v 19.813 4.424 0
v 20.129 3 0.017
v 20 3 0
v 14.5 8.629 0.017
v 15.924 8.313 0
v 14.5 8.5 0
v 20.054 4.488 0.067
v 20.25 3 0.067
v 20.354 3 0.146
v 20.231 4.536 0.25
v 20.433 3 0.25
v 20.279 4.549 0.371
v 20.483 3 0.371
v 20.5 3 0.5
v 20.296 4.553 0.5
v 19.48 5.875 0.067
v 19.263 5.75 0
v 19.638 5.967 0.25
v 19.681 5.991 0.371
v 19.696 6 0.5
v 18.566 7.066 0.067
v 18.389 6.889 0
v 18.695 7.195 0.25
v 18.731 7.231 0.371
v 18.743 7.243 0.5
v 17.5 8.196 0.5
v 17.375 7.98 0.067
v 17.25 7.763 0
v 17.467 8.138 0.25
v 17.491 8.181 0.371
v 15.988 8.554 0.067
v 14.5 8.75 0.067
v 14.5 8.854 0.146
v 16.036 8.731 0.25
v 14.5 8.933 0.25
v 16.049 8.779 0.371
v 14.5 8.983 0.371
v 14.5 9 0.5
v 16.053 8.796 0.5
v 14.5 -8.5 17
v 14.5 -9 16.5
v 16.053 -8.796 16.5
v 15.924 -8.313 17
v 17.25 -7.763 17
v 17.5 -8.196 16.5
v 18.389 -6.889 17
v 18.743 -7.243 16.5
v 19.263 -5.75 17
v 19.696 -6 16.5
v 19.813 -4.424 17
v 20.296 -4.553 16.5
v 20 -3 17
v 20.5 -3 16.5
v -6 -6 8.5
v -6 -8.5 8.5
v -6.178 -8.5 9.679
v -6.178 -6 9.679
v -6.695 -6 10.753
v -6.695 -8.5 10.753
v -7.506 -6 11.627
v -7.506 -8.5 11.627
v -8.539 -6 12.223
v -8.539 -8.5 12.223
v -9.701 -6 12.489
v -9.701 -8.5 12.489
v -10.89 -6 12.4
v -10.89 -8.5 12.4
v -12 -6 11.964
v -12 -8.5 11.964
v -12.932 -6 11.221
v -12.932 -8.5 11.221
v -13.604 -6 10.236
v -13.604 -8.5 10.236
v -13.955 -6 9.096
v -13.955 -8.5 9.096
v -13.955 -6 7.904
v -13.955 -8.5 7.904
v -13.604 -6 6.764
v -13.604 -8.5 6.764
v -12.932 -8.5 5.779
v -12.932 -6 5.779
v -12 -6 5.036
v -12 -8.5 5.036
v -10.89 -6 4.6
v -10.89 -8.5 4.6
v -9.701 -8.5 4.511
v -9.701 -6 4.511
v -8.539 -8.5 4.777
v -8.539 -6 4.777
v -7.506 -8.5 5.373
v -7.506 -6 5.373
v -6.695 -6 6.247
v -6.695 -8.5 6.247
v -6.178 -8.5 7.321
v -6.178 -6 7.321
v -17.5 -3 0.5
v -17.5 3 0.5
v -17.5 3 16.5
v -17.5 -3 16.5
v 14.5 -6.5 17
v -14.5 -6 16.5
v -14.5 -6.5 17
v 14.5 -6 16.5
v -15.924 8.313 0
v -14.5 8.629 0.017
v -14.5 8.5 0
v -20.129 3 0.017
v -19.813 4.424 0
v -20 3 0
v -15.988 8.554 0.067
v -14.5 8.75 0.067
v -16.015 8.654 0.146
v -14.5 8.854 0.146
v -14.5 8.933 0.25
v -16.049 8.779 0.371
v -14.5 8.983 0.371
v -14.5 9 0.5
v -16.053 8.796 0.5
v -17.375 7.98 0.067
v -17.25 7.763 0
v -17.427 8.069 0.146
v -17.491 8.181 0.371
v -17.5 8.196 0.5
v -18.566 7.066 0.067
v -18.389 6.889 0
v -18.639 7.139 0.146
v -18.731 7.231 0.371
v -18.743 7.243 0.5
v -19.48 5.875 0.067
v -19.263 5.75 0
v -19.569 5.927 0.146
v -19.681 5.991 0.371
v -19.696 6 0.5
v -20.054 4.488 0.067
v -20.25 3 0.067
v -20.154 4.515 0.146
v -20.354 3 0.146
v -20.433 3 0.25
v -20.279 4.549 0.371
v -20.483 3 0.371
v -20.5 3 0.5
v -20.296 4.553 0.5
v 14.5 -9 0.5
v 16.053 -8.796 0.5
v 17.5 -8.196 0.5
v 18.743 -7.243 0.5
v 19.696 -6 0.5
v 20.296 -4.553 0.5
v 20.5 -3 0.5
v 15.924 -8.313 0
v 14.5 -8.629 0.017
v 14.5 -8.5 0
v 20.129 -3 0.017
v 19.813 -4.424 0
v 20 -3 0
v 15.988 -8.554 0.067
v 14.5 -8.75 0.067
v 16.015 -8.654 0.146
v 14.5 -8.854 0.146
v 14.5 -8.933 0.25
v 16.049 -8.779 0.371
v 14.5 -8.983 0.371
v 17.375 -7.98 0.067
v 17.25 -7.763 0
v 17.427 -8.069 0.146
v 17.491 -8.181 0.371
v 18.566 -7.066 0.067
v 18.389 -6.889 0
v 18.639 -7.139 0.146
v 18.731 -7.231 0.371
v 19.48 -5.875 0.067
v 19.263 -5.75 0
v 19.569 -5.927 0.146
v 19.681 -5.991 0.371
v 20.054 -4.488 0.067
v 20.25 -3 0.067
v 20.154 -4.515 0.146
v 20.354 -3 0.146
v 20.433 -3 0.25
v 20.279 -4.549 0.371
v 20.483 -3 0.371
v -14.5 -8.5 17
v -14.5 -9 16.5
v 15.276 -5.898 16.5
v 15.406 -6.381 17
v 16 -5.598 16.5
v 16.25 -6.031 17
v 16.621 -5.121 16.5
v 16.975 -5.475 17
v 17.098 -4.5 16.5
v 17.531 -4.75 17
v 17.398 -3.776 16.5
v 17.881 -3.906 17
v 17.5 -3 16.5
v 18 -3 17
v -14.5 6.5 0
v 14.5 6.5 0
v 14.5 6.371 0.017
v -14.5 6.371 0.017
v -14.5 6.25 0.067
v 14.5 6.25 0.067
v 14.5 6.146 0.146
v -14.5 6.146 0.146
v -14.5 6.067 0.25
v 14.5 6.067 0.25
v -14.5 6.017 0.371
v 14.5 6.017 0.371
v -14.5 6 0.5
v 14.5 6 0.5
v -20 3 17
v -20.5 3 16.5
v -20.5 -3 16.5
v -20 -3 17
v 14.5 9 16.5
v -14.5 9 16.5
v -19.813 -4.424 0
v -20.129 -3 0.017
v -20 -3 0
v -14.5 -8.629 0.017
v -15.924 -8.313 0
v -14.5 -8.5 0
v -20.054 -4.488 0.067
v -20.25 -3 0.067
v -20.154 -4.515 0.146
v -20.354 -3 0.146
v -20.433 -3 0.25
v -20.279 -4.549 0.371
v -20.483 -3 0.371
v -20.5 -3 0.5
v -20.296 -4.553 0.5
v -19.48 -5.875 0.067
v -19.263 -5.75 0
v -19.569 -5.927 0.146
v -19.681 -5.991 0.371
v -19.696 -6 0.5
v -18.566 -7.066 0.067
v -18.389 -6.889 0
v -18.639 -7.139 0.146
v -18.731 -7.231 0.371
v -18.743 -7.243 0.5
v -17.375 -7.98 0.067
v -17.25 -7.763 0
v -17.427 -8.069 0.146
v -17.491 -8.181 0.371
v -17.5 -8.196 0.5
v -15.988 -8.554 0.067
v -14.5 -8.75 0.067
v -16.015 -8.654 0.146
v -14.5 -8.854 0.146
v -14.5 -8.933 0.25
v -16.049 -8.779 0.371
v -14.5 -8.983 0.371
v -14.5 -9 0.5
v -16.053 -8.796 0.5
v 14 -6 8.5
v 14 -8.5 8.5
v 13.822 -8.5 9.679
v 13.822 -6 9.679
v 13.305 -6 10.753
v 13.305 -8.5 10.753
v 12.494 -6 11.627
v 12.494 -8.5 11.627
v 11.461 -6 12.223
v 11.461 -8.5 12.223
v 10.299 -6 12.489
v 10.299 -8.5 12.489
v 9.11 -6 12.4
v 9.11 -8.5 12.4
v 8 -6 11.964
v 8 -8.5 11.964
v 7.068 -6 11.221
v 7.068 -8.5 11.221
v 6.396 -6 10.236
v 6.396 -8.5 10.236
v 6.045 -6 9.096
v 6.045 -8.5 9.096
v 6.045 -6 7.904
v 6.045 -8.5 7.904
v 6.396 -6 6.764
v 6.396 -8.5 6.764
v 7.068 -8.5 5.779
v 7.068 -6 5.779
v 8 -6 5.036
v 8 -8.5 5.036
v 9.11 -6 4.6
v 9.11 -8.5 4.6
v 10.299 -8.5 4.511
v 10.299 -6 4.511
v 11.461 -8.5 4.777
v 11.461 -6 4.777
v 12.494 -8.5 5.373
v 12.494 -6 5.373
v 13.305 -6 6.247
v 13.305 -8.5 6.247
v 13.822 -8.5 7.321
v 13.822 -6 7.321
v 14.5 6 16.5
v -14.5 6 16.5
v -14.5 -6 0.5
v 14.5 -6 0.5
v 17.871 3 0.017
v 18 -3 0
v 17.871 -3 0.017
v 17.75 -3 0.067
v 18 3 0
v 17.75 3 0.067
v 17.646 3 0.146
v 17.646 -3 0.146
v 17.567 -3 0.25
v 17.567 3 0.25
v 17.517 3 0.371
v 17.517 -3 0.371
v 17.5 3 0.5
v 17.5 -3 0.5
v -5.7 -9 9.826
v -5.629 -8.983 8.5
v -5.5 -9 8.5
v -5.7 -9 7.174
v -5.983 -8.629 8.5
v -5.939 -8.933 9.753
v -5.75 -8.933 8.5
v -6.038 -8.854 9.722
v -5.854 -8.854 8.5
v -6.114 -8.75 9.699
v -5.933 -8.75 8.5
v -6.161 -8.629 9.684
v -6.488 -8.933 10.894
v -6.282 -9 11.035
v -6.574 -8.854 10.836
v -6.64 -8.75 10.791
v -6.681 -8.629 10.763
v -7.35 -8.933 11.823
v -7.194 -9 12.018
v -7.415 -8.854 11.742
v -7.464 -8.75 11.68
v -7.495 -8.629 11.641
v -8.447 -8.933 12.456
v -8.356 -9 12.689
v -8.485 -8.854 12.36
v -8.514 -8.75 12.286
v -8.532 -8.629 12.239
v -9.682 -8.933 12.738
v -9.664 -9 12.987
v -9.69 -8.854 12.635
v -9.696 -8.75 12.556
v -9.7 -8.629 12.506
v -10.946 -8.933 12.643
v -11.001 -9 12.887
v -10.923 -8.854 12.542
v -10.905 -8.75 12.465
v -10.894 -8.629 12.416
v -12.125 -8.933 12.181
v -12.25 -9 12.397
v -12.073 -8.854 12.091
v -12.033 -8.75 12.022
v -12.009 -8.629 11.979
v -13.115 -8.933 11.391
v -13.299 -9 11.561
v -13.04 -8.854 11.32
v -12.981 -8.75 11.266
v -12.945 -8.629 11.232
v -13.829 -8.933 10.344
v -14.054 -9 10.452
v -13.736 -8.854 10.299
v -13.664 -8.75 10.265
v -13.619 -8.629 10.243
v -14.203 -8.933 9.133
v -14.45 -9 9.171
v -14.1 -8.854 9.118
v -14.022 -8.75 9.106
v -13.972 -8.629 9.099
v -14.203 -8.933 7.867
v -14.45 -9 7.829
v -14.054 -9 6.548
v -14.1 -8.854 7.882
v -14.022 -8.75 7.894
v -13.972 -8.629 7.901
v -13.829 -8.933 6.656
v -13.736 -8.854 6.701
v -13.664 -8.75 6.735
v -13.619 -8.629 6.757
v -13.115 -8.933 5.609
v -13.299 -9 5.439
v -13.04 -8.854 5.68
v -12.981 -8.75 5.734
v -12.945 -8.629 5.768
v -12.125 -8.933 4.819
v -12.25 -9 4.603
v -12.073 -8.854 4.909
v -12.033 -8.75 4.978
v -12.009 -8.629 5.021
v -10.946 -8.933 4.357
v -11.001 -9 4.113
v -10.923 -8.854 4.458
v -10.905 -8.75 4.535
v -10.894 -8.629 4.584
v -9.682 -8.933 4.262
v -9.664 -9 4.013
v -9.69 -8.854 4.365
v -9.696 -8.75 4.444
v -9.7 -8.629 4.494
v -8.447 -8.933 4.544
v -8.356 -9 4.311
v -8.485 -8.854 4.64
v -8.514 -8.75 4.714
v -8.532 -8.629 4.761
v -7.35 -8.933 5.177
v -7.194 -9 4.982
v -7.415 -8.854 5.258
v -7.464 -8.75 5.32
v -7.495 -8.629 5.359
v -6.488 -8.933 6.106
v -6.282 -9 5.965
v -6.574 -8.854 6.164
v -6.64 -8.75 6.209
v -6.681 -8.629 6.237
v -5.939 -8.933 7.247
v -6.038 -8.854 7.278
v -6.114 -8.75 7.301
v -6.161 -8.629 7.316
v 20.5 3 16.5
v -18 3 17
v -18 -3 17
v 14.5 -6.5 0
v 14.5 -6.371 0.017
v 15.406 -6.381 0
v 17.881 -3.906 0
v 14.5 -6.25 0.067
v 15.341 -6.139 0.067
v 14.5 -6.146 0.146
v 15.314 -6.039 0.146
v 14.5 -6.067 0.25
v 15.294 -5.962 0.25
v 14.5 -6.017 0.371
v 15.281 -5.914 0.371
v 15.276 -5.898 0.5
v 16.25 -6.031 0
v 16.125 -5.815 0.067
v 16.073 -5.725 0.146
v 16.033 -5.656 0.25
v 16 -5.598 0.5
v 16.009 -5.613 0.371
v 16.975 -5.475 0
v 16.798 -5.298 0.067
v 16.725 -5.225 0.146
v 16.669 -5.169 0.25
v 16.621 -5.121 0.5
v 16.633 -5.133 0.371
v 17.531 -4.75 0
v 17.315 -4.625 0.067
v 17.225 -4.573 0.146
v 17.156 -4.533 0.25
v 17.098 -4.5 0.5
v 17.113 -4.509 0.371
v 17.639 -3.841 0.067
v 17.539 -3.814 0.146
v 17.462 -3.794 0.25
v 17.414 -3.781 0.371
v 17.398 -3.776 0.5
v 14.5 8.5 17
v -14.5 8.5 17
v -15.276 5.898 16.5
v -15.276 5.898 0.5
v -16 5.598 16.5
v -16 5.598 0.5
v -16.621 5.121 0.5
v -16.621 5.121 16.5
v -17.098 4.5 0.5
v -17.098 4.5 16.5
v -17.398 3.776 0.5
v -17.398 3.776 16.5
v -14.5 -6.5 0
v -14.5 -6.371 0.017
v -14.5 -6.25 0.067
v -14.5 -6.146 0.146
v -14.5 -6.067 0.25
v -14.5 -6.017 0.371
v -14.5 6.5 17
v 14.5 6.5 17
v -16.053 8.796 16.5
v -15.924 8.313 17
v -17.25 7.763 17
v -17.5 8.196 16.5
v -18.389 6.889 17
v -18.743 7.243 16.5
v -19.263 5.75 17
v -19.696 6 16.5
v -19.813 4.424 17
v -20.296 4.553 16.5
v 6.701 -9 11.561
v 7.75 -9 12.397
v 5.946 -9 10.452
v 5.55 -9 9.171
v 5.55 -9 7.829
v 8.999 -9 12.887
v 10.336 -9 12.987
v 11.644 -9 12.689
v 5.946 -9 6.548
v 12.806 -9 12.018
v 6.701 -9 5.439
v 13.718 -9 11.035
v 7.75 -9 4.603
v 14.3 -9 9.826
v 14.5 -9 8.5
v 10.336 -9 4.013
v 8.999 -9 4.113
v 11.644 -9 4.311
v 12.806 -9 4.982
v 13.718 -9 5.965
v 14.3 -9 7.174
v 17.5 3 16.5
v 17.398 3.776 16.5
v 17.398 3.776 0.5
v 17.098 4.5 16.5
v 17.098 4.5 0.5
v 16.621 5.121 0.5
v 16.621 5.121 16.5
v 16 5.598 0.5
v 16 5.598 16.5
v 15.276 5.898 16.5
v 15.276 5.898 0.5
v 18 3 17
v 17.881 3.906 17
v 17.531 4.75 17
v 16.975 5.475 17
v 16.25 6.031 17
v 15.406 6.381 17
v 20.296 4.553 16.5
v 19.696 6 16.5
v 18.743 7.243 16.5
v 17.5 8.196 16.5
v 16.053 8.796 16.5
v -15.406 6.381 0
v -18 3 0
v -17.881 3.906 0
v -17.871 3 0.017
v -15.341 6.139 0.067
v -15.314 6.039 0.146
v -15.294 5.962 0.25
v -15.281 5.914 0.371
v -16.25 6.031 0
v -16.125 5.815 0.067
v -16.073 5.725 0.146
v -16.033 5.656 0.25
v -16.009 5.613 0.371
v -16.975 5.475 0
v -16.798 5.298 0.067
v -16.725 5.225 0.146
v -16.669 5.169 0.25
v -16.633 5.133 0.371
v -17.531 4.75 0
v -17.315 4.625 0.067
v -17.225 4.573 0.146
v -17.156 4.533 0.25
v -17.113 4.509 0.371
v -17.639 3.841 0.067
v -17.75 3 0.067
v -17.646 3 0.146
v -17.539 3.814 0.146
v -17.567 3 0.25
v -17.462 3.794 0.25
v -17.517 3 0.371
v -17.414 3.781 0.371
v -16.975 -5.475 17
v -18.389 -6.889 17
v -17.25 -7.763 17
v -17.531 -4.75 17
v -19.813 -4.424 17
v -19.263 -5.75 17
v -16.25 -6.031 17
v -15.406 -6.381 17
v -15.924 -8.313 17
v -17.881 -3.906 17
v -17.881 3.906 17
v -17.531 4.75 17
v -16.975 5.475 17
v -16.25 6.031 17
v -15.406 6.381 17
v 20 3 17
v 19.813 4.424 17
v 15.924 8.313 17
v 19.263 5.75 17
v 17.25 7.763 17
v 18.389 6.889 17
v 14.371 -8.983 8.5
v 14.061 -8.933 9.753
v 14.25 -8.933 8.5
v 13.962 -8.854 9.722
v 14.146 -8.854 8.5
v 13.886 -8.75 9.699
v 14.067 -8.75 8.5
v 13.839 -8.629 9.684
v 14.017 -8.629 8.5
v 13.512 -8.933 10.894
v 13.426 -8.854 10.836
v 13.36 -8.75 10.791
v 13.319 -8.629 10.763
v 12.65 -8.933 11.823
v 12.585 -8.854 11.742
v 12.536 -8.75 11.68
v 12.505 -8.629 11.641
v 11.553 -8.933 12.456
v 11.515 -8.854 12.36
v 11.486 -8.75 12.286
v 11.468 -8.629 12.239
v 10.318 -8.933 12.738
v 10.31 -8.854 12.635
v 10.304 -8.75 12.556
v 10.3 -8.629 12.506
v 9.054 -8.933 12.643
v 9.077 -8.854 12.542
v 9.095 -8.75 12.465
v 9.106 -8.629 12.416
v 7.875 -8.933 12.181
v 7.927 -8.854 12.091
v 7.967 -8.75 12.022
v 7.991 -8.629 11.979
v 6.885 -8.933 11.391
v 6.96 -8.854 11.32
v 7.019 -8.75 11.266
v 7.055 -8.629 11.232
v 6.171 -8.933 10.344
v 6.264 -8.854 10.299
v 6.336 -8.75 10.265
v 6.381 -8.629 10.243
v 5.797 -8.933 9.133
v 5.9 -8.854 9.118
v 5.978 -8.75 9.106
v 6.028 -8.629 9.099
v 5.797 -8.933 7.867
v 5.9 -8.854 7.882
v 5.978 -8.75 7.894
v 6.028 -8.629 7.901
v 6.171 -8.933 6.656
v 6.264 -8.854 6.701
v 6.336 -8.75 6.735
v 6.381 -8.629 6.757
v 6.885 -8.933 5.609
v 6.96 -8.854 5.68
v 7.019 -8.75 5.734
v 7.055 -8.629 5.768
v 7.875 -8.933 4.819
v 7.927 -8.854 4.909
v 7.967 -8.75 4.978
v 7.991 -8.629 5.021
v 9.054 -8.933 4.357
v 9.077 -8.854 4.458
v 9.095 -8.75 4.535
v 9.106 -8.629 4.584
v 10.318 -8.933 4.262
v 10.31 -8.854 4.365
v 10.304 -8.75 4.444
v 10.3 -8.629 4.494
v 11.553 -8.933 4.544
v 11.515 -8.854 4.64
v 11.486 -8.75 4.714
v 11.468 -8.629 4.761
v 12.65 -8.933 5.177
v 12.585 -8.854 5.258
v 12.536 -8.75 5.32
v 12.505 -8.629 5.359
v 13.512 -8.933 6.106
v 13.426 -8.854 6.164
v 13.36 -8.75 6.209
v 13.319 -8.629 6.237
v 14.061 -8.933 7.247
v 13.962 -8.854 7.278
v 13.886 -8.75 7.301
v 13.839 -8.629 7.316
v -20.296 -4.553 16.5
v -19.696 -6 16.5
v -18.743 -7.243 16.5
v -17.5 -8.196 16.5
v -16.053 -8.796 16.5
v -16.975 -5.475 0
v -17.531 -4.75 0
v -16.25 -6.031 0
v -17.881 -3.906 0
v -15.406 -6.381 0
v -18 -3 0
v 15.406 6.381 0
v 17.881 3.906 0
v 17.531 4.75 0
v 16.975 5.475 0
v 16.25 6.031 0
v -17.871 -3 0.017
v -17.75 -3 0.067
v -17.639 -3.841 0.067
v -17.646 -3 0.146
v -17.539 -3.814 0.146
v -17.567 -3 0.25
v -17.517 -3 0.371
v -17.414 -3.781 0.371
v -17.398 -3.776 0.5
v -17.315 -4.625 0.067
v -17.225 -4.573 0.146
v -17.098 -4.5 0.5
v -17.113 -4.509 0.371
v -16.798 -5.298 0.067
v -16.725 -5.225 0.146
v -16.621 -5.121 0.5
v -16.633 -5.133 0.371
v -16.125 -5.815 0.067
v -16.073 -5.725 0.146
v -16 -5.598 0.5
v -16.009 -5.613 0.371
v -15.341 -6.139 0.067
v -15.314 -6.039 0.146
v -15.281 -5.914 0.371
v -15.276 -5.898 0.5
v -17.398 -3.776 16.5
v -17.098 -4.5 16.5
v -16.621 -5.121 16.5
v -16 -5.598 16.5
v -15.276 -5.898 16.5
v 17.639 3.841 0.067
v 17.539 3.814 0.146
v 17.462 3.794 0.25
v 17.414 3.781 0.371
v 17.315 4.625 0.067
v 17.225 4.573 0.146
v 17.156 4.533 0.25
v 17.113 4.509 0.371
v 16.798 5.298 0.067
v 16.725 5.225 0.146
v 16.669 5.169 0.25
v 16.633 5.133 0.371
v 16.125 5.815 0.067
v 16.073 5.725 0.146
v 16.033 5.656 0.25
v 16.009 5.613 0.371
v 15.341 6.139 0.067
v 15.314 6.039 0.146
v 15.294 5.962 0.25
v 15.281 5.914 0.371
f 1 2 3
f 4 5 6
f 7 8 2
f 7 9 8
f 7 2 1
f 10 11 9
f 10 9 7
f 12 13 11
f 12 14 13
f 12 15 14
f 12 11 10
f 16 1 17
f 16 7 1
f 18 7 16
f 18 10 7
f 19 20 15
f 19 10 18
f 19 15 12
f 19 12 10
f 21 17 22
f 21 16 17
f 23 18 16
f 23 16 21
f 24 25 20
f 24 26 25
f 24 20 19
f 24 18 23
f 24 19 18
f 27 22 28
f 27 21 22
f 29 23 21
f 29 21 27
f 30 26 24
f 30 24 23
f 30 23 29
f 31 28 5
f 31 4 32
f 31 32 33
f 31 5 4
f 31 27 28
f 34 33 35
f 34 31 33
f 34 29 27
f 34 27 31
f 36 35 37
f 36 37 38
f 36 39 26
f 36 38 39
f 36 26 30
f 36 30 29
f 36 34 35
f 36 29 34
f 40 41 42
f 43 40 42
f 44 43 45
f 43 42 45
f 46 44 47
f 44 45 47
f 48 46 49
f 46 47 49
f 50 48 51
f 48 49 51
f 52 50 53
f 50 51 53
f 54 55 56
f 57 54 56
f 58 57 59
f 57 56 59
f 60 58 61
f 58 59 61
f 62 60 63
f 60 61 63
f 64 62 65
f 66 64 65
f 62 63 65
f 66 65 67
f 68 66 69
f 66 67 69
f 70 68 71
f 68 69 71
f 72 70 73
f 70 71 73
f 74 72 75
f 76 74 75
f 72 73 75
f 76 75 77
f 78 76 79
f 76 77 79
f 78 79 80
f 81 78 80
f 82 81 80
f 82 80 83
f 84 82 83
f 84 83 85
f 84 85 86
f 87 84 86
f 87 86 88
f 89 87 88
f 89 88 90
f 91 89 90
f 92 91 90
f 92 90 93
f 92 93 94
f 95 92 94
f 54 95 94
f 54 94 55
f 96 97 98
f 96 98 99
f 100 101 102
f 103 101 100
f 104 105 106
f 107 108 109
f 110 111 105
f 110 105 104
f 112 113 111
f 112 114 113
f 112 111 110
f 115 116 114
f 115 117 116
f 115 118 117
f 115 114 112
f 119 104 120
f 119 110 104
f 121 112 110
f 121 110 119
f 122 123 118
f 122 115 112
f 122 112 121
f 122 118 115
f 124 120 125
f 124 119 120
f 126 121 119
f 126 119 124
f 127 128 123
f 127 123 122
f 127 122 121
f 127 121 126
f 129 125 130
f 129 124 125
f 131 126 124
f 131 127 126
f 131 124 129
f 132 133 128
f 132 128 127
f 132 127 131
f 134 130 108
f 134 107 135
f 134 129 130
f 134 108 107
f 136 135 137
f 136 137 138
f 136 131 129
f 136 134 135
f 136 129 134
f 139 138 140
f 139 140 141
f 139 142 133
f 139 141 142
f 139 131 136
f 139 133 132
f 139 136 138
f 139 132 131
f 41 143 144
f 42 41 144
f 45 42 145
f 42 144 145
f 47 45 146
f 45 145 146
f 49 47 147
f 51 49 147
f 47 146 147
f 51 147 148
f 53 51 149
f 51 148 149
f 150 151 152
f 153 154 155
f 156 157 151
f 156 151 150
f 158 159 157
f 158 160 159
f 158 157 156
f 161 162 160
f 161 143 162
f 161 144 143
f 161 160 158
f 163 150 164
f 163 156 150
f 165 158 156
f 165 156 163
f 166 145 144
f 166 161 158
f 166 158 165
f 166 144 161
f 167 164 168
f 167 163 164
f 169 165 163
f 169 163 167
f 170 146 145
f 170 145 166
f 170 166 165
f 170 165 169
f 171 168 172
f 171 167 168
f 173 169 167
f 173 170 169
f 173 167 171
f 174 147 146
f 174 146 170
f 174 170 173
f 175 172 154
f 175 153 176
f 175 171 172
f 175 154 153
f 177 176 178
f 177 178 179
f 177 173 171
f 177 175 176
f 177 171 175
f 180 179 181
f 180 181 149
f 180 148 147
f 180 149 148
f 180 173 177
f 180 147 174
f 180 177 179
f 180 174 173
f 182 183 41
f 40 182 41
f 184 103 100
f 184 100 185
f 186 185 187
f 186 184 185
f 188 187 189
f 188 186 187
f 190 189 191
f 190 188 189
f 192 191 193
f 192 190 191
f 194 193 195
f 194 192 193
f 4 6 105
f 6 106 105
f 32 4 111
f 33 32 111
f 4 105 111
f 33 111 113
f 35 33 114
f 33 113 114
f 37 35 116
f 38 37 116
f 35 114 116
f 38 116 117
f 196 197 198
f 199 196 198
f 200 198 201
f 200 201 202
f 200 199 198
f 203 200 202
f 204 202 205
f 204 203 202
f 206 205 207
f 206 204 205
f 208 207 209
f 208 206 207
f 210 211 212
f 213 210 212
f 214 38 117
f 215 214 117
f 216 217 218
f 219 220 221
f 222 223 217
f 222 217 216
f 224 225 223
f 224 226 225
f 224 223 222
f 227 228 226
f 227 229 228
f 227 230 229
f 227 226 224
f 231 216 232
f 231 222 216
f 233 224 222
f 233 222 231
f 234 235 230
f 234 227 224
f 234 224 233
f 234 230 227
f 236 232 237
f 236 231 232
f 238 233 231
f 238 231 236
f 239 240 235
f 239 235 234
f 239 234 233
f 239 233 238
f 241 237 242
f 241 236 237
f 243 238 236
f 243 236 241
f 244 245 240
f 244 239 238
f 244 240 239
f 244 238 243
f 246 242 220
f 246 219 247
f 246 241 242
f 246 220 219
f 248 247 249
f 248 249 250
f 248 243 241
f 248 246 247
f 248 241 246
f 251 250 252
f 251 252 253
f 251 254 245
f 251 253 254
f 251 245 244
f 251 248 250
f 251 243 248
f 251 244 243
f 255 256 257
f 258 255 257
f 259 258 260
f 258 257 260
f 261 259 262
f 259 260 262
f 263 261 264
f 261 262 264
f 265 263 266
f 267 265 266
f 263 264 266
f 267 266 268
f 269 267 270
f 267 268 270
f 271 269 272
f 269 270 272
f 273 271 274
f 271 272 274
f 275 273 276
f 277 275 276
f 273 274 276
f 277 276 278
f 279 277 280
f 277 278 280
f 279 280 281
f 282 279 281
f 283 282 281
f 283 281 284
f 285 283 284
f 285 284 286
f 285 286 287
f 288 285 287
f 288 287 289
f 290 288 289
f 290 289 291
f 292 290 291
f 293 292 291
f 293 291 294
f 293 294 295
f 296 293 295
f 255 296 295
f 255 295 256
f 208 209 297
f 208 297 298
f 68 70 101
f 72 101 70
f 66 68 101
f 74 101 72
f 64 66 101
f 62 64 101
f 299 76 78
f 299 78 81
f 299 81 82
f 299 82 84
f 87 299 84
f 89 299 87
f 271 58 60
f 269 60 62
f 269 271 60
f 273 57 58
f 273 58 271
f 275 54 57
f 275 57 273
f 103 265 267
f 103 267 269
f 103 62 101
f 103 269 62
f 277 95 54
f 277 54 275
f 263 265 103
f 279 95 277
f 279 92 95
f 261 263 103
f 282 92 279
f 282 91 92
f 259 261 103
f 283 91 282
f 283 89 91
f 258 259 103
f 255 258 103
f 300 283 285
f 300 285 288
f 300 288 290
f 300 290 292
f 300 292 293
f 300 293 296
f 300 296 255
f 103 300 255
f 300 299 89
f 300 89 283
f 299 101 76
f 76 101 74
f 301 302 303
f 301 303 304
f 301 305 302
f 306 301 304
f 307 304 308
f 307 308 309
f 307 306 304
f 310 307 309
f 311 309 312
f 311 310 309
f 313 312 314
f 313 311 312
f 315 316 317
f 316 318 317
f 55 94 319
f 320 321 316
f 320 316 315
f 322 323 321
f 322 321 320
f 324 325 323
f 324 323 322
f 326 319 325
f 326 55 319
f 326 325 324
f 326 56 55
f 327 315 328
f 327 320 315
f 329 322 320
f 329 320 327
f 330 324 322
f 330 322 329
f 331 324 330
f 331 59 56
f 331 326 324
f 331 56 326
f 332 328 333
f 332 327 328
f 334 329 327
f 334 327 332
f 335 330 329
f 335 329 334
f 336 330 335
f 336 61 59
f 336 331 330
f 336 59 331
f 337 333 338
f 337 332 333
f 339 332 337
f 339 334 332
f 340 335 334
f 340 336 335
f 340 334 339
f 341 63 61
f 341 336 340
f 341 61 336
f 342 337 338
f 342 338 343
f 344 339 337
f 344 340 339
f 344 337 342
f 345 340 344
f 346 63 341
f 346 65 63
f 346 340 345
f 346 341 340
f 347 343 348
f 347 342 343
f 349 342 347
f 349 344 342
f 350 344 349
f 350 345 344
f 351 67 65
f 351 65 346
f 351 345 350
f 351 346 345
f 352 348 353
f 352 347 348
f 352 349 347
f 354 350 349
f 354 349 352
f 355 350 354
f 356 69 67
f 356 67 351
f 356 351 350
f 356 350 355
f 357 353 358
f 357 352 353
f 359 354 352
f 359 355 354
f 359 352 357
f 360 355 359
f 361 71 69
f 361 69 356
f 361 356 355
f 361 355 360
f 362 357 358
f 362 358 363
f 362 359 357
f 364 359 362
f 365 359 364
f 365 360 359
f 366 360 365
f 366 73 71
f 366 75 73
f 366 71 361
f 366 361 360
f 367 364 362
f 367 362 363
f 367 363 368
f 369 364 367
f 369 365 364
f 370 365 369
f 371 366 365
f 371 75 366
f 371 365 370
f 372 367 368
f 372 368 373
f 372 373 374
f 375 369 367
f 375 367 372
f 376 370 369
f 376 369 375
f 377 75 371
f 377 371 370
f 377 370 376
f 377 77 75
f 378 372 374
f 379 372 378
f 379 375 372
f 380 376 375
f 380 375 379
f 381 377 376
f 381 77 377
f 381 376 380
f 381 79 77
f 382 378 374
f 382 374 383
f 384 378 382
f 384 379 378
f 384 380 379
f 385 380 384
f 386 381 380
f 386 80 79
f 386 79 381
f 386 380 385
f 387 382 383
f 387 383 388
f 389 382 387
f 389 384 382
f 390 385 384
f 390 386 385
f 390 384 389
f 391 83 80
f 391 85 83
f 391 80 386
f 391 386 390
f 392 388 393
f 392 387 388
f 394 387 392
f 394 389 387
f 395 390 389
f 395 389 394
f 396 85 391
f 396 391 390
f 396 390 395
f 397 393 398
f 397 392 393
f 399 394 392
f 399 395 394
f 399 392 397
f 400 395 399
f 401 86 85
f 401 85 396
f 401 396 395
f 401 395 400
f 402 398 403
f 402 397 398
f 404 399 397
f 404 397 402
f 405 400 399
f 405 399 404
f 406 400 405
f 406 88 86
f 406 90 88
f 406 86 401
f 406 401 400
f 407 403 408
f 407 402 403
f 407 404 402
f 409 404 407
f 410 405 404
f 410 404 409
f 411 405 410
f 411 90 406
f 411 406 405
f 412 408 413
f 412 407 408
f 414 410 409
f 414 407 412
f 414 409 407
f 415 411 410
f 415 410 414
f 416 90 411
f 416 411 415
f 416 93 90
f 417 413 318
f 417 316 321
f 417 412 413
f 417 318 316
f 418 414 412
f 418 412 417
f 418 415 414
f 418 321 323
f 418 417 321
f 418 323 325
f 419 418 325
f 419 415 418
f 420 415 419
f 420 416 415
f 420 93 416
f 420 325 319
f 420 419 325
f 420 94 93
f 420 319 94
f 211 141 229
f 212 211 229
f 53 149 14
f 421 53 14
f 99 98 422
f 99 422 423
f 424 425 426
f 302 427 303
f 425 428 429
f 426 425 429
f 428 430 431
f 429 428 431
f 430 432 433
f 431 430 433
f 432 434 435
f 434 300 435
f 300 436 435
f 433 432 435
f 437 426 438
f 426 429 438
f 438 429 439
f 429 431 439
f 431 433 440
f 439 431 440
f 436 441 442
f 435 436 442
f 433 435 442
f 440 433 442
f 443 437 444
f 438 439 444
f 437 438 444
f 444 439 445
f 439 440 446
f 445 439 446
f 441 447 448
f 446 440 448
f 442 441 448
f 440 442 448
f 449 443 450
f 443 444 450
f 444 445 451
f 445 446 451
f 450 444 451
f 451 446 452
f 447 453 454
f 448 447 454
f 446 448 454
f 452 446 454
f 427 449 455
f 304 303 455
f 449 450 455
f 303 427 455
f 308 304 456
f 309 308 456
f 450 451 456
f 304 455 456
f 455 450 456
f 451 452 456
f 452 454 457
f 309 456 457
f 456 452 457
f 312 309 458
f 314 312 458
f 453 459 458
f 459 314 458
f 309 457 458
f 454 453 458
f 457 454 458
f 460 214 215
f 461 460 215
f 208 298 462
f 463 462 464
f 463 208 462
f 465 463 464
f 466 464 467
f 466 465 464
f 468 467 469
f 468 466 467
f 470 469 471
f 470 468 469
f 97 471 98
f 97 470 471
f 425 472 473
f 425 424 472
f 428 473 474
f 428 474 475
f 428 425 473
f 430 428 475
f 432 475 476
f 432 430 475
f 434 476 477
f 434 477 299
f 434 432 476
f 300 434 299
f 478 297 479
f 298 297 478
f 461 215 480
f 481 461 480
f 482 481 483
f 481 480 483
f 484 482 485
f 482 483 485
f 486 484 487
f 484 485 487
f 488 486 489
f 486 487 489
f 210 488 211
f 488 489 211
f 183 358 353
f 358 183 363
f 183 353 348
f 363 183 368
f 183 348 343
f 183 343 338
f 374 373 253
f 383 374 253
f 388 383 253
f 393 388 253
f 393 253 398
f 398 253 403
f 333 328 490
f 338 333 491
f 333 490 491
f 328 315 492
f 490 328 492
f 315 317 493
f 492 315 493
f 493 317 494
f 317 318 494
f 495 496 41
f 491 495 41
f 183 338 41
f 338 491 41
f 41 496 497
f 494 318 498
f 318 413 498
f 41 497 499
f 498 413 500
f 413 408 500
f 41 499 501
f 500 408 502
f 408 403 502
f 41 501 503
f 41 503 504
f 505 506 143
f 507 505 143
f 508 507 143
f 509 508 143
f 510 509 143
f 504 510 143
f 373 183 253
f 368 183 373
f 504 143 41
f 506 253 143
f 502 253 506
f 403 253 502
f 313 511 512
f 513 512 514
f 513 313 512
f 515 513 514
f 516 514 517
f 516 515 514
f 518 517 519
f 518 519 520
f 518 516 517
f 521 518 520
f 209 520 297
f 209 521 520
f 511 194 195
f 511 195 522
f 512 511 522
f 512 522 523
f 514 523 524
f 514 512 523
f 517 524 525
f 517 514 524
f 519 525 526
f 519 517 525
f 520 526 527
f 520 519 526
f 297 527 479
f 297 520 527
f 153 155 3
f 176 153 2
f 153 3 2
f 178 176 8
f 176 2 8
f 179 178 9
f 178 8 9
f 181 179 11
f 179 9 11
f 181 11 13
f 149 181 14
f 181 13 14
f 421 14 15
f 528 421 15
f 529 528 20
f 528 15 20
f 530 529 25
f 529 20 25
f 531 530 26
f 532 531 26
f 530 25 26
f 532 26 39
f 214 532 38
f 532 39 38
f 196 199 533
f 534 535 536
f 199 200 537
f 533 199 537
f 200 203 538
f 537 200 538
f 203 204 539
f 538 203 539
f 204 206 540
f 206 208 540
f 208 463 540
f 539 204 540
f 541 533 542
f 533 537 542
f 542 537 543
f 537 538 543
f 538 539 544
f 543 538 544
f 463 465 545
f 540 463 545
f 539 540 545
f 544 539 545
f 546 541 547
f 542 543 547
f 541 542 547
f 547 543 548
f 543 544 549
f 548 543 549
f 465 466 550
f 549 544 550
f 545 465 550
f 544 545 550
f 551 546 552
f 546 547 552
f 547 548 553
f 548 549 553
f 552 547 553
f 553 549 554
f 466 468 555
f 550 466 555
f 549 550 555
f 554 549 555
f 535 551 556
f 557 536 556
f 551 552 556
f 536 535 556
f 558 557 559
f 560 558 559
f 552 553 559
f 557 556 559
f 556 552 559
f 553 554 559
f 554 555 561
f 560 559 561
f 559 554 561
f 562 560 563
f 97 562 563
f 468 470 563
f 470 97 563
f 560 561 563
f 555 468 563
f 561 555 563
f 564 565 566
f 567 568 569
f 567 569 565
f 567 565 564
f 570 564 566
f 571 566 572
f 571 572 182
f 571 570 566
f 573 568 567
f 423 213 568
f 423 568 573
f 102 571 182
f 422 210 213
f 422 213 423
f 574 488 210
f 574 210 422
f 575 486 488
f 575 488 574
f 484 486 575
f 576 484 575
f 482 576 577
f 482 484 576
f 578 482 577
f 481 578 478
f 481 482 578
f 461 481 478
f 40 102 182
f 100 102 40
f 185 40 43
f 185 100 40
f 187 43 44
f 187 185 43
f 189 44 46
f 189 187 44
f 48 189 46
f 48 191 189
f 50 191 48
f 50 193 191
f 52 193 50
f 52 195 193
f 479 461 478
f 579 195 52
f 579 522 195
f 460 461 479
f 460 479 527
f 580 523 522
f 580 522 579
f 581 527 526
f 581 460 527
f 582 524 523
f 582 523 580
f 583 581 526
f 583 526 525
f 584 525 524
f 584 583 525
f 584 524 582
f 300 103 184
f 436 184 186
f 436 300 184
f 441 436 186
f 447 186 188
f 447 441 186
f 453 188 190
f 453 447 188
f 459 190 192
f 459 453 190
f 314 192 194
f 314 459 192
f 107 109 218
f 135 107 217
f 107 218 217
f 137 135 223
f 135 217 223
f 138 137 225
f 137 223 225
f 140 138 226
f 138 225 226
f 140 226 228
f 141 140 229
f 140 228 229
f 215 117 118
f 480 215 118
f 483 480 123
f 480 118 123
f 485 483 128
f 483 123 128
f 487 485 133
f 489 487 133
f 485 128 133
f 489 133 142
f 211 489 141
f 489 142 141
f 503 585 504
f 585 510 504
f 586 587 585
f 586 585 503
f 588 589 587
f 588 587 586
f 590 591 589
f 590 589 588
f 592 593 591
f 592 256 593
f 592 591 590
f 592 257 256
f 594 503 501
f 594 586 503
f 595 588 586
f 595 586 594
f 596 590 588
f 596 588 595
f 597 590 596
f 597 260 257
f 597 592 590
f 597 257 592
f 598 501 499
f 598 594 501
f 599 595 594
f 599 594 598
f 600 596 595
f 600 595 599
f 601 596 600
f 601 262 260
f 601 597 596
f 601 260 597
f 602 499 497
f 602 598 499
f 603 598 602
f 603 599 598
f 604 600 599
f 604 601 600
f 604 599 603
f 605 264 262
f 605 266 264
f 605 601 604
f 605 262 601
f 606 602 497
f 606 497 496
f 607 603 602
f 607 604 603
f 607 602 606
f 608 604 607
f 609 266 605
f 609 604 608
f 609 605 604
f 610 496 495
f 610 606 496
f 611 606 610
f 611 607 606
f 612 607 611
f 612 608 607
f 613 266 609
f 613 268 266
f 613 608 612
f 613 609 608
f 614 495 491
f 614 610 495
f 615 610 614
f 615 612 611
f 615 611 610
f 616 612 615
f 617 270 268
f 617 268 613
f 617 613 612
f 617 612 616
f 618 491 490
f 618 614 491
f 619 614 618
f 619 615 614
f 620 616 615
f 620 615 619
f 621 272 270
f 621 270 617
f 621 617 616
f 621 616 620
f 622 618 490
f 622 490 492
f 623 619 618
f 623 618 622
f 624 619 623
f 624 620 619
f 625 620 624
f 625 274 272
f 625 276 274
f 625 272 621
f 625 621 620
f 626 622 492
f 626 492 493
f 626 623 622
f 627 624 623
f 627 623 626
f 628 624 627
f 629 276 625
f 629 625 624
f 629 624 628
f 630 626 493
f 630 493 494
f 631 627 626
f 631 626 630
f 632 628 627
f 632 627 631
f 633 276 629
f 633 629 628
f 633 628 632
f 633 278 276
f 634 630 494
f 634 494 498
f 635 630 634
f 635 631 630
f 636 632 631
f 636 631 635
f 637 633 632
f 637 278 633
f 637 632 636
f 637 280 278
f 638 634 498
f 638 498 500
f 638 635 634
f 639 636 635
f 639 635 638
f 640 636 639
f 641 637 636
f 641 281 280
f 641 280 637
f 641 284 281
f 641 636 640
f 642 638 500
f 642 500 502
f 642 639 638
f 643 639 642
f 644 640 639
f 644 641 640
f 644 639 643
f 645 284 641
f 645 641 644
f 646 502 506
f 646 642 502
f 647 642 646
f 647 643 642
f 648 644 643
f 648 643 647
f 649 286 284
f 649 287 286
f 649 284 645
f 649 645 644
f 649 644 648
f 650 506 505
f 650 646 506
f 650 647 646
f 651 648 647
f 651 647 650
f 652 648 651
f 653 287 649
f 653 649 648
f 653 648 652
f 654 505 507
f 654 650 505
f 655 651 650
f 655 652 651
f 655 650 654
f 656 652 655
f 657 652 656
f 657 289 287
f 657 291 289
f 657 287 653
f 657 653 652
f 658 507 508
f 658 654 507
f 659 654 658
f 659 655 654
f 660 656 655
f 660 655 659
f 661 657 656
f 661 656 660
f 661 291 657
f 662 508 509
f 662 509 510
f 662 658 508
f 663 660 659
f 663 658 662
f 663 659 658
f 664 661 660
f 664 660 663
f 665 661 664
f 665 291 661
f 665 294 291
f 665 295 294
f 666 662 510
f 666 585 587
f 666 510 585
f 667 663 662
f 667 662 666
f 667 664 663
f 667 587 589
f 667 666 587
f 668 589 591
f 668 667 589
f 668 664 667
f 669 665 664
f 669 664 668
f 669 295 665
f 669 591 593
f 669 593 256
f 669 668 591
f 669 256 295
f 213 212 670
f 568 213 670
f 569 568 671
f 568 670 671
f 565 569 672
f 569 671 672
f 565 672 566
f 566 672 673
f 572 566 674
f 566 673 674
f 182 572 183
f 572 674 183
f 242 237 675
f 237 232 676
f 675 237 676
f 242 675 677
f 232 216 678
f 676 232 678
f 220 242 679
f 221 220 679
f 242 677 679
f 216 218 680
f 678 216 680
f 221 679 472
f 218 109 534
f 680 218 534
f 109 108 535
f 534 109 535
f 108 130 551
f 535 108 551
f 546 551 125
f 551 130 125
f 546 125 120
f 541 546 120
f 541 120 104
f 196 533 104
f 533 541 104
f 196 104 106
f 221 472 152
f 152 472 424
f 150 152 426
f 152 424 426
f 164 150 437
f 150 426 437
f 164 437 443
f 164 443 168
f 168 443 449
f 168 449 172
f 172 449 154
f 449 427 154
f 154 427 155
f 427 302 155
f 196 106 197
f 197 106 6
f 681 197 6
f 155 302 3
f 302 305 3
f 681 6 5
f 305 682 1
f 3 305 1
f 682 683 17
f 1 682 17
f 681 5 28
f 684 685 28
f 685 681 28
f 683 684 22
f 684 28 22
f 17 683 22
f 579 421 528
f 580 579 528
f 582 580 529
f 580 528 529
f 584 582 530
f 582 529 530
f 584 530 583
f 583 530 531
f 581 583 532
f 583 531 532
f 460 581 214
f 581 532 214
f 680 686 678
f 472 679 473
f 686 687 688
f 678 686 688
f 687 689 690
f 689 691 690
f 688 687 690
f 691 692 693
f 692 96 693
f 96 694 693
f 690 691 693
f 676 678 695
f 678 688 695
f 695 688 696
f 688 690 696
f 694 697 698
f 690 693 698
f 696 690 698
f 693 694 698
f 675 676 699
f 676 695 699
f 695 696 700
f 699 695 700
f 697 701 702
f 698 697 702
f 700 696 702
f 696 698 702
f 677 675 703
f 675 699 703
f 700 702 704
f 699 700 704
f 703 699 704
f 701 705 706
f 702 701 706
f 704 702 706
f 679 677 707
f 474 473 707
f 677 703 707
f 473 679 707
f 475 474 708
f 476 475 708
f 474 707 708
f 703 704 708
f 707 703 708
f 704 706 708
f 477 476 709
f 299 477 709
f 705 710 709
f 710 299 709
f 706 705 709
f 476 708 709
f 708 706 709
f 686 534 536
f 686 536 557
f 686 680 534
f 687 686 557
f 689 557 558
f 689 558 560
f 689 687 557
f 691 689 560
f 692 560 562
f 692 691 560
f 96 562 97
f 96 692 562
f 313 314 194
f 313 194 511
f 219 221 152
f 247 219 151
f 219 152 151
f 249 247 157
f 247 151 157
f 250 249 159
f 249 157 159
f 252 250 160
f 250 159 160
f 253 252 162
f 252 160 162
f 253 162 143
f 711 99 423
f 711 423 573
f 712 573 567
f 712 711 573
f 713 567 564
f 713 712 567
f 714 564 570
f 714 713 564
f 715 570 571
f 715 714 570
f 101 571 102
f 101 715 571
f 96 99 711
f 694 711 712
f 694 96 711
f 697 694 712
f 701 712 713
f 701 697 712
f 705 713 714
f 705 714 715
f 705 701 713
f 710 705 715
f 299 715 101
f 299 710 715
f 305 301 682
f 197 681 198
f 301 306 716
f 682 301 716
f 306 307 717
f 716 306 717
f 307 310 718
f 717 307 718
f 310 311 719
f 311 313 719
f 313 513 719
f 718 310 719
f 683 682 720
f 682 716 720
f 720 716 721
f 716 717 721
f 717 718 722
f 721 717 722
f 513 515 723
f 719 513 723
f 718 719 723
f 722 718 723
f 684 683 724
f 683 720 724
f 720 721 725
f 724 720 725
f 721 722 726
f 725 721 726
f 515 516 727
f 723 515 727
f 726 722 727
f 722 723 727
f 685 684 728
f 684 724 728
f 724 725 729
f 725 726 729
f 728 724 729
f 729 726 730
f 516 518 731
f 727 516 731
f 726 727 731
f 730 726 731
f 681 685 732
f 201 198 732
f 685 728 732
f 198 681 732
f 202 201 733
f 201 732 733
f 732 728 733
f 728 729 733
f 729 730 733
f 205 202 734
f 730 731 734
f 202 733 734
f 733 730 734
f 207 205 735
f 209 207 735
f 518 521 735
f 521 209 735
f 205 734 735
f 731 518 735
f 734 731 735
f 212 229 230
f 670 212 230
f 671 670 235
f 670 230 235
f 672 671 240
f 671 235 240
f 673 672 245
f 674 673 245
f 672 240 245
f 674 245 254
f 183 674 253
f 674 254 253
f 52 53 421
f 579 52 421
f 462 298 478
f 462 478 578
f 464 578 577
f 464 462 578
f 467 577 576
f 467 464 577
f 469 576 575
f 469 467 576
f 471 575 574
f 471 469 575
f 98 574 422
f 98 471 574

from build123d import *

# Parameters (mm, degrees)
F1_DEPTH = 17
F2_T     = -3
F3_R     = 4
F4_DEPTH = 5
F5_R     = 0.49999
F6_SIZE  = 0.5


# Not quite as in the source:
# - a fillet or chamfer is up to 0.001 mm smaller than in the source, because OpenCascade refuses the exact size


with BuildPart() as f1:
    # F0 (on Top) → F1 (new body)
    with BuildSketch(Plane.XY):
        with BuildLine():
            ThreePointArc((-20.5, -3), (-18.7426406871, -7.2426406871), (-14.5, -9))
            Line((-14.5, -9), (14.5, -9))
            ThreePointArc((14.5, -9), (18.7426406871, -7.2426406871), (20.5, -3))
            Line((20.5, -3), (20.5, 3))
            ThreePointArc((20.5, 3), (18.7426406871, 7.2426406871), (14.5, 9))
            Line((14.5, 9), (-14.5, 9))
            ThreePointArc((-14.5, 9), (-18.7426406871, 7.2426406871), (-20.5, 3))
            Line((-20.5, 3), (-20.5, -3))
        make_face()
    extrude(amount=F1_DEPTH)

    # F2
    f2_openings = [f1.faces().sort_by_distance(p)[0] for p in [
        (0, 0, 17),
        (0, 0, 0),
    ]]
    offset(amount=F2_T, openings=f2_openings)

    # F3 (on face) → F4 (cut)
    with BuildSketch(Plane.XZ.offset(9)):
        with Locations((-10, 8.5)):
            Circle(F3_R)
        with Locations((10, 8.5)):
            Circle(F3_R)
    extrude(amount=-F4_DEPTH, mode=Mode.SUBTRACT)

    # F5 (radius 0.5 in the source; OpenCascade refuses exactly that, so slightly less here)
    f5_edges = [f1.edges().sort_by_distance(p)[0] for p in [
        (0, 9, 0),
        (0, -6, 0),
        (6, -9, 8.5),
        (-14, -9, 8.5),
    ]]
    fillet(f5_edges, radius=F5_R)

    # F6
    f6_edges = [f1.edges().sort_by_distance(p)[0] for p in [
        (0, -9, 17),
        (0, -6, 17),
    ]]
    chamfer(f6_edges, length=F6_SIZE)


solid = f1.part
